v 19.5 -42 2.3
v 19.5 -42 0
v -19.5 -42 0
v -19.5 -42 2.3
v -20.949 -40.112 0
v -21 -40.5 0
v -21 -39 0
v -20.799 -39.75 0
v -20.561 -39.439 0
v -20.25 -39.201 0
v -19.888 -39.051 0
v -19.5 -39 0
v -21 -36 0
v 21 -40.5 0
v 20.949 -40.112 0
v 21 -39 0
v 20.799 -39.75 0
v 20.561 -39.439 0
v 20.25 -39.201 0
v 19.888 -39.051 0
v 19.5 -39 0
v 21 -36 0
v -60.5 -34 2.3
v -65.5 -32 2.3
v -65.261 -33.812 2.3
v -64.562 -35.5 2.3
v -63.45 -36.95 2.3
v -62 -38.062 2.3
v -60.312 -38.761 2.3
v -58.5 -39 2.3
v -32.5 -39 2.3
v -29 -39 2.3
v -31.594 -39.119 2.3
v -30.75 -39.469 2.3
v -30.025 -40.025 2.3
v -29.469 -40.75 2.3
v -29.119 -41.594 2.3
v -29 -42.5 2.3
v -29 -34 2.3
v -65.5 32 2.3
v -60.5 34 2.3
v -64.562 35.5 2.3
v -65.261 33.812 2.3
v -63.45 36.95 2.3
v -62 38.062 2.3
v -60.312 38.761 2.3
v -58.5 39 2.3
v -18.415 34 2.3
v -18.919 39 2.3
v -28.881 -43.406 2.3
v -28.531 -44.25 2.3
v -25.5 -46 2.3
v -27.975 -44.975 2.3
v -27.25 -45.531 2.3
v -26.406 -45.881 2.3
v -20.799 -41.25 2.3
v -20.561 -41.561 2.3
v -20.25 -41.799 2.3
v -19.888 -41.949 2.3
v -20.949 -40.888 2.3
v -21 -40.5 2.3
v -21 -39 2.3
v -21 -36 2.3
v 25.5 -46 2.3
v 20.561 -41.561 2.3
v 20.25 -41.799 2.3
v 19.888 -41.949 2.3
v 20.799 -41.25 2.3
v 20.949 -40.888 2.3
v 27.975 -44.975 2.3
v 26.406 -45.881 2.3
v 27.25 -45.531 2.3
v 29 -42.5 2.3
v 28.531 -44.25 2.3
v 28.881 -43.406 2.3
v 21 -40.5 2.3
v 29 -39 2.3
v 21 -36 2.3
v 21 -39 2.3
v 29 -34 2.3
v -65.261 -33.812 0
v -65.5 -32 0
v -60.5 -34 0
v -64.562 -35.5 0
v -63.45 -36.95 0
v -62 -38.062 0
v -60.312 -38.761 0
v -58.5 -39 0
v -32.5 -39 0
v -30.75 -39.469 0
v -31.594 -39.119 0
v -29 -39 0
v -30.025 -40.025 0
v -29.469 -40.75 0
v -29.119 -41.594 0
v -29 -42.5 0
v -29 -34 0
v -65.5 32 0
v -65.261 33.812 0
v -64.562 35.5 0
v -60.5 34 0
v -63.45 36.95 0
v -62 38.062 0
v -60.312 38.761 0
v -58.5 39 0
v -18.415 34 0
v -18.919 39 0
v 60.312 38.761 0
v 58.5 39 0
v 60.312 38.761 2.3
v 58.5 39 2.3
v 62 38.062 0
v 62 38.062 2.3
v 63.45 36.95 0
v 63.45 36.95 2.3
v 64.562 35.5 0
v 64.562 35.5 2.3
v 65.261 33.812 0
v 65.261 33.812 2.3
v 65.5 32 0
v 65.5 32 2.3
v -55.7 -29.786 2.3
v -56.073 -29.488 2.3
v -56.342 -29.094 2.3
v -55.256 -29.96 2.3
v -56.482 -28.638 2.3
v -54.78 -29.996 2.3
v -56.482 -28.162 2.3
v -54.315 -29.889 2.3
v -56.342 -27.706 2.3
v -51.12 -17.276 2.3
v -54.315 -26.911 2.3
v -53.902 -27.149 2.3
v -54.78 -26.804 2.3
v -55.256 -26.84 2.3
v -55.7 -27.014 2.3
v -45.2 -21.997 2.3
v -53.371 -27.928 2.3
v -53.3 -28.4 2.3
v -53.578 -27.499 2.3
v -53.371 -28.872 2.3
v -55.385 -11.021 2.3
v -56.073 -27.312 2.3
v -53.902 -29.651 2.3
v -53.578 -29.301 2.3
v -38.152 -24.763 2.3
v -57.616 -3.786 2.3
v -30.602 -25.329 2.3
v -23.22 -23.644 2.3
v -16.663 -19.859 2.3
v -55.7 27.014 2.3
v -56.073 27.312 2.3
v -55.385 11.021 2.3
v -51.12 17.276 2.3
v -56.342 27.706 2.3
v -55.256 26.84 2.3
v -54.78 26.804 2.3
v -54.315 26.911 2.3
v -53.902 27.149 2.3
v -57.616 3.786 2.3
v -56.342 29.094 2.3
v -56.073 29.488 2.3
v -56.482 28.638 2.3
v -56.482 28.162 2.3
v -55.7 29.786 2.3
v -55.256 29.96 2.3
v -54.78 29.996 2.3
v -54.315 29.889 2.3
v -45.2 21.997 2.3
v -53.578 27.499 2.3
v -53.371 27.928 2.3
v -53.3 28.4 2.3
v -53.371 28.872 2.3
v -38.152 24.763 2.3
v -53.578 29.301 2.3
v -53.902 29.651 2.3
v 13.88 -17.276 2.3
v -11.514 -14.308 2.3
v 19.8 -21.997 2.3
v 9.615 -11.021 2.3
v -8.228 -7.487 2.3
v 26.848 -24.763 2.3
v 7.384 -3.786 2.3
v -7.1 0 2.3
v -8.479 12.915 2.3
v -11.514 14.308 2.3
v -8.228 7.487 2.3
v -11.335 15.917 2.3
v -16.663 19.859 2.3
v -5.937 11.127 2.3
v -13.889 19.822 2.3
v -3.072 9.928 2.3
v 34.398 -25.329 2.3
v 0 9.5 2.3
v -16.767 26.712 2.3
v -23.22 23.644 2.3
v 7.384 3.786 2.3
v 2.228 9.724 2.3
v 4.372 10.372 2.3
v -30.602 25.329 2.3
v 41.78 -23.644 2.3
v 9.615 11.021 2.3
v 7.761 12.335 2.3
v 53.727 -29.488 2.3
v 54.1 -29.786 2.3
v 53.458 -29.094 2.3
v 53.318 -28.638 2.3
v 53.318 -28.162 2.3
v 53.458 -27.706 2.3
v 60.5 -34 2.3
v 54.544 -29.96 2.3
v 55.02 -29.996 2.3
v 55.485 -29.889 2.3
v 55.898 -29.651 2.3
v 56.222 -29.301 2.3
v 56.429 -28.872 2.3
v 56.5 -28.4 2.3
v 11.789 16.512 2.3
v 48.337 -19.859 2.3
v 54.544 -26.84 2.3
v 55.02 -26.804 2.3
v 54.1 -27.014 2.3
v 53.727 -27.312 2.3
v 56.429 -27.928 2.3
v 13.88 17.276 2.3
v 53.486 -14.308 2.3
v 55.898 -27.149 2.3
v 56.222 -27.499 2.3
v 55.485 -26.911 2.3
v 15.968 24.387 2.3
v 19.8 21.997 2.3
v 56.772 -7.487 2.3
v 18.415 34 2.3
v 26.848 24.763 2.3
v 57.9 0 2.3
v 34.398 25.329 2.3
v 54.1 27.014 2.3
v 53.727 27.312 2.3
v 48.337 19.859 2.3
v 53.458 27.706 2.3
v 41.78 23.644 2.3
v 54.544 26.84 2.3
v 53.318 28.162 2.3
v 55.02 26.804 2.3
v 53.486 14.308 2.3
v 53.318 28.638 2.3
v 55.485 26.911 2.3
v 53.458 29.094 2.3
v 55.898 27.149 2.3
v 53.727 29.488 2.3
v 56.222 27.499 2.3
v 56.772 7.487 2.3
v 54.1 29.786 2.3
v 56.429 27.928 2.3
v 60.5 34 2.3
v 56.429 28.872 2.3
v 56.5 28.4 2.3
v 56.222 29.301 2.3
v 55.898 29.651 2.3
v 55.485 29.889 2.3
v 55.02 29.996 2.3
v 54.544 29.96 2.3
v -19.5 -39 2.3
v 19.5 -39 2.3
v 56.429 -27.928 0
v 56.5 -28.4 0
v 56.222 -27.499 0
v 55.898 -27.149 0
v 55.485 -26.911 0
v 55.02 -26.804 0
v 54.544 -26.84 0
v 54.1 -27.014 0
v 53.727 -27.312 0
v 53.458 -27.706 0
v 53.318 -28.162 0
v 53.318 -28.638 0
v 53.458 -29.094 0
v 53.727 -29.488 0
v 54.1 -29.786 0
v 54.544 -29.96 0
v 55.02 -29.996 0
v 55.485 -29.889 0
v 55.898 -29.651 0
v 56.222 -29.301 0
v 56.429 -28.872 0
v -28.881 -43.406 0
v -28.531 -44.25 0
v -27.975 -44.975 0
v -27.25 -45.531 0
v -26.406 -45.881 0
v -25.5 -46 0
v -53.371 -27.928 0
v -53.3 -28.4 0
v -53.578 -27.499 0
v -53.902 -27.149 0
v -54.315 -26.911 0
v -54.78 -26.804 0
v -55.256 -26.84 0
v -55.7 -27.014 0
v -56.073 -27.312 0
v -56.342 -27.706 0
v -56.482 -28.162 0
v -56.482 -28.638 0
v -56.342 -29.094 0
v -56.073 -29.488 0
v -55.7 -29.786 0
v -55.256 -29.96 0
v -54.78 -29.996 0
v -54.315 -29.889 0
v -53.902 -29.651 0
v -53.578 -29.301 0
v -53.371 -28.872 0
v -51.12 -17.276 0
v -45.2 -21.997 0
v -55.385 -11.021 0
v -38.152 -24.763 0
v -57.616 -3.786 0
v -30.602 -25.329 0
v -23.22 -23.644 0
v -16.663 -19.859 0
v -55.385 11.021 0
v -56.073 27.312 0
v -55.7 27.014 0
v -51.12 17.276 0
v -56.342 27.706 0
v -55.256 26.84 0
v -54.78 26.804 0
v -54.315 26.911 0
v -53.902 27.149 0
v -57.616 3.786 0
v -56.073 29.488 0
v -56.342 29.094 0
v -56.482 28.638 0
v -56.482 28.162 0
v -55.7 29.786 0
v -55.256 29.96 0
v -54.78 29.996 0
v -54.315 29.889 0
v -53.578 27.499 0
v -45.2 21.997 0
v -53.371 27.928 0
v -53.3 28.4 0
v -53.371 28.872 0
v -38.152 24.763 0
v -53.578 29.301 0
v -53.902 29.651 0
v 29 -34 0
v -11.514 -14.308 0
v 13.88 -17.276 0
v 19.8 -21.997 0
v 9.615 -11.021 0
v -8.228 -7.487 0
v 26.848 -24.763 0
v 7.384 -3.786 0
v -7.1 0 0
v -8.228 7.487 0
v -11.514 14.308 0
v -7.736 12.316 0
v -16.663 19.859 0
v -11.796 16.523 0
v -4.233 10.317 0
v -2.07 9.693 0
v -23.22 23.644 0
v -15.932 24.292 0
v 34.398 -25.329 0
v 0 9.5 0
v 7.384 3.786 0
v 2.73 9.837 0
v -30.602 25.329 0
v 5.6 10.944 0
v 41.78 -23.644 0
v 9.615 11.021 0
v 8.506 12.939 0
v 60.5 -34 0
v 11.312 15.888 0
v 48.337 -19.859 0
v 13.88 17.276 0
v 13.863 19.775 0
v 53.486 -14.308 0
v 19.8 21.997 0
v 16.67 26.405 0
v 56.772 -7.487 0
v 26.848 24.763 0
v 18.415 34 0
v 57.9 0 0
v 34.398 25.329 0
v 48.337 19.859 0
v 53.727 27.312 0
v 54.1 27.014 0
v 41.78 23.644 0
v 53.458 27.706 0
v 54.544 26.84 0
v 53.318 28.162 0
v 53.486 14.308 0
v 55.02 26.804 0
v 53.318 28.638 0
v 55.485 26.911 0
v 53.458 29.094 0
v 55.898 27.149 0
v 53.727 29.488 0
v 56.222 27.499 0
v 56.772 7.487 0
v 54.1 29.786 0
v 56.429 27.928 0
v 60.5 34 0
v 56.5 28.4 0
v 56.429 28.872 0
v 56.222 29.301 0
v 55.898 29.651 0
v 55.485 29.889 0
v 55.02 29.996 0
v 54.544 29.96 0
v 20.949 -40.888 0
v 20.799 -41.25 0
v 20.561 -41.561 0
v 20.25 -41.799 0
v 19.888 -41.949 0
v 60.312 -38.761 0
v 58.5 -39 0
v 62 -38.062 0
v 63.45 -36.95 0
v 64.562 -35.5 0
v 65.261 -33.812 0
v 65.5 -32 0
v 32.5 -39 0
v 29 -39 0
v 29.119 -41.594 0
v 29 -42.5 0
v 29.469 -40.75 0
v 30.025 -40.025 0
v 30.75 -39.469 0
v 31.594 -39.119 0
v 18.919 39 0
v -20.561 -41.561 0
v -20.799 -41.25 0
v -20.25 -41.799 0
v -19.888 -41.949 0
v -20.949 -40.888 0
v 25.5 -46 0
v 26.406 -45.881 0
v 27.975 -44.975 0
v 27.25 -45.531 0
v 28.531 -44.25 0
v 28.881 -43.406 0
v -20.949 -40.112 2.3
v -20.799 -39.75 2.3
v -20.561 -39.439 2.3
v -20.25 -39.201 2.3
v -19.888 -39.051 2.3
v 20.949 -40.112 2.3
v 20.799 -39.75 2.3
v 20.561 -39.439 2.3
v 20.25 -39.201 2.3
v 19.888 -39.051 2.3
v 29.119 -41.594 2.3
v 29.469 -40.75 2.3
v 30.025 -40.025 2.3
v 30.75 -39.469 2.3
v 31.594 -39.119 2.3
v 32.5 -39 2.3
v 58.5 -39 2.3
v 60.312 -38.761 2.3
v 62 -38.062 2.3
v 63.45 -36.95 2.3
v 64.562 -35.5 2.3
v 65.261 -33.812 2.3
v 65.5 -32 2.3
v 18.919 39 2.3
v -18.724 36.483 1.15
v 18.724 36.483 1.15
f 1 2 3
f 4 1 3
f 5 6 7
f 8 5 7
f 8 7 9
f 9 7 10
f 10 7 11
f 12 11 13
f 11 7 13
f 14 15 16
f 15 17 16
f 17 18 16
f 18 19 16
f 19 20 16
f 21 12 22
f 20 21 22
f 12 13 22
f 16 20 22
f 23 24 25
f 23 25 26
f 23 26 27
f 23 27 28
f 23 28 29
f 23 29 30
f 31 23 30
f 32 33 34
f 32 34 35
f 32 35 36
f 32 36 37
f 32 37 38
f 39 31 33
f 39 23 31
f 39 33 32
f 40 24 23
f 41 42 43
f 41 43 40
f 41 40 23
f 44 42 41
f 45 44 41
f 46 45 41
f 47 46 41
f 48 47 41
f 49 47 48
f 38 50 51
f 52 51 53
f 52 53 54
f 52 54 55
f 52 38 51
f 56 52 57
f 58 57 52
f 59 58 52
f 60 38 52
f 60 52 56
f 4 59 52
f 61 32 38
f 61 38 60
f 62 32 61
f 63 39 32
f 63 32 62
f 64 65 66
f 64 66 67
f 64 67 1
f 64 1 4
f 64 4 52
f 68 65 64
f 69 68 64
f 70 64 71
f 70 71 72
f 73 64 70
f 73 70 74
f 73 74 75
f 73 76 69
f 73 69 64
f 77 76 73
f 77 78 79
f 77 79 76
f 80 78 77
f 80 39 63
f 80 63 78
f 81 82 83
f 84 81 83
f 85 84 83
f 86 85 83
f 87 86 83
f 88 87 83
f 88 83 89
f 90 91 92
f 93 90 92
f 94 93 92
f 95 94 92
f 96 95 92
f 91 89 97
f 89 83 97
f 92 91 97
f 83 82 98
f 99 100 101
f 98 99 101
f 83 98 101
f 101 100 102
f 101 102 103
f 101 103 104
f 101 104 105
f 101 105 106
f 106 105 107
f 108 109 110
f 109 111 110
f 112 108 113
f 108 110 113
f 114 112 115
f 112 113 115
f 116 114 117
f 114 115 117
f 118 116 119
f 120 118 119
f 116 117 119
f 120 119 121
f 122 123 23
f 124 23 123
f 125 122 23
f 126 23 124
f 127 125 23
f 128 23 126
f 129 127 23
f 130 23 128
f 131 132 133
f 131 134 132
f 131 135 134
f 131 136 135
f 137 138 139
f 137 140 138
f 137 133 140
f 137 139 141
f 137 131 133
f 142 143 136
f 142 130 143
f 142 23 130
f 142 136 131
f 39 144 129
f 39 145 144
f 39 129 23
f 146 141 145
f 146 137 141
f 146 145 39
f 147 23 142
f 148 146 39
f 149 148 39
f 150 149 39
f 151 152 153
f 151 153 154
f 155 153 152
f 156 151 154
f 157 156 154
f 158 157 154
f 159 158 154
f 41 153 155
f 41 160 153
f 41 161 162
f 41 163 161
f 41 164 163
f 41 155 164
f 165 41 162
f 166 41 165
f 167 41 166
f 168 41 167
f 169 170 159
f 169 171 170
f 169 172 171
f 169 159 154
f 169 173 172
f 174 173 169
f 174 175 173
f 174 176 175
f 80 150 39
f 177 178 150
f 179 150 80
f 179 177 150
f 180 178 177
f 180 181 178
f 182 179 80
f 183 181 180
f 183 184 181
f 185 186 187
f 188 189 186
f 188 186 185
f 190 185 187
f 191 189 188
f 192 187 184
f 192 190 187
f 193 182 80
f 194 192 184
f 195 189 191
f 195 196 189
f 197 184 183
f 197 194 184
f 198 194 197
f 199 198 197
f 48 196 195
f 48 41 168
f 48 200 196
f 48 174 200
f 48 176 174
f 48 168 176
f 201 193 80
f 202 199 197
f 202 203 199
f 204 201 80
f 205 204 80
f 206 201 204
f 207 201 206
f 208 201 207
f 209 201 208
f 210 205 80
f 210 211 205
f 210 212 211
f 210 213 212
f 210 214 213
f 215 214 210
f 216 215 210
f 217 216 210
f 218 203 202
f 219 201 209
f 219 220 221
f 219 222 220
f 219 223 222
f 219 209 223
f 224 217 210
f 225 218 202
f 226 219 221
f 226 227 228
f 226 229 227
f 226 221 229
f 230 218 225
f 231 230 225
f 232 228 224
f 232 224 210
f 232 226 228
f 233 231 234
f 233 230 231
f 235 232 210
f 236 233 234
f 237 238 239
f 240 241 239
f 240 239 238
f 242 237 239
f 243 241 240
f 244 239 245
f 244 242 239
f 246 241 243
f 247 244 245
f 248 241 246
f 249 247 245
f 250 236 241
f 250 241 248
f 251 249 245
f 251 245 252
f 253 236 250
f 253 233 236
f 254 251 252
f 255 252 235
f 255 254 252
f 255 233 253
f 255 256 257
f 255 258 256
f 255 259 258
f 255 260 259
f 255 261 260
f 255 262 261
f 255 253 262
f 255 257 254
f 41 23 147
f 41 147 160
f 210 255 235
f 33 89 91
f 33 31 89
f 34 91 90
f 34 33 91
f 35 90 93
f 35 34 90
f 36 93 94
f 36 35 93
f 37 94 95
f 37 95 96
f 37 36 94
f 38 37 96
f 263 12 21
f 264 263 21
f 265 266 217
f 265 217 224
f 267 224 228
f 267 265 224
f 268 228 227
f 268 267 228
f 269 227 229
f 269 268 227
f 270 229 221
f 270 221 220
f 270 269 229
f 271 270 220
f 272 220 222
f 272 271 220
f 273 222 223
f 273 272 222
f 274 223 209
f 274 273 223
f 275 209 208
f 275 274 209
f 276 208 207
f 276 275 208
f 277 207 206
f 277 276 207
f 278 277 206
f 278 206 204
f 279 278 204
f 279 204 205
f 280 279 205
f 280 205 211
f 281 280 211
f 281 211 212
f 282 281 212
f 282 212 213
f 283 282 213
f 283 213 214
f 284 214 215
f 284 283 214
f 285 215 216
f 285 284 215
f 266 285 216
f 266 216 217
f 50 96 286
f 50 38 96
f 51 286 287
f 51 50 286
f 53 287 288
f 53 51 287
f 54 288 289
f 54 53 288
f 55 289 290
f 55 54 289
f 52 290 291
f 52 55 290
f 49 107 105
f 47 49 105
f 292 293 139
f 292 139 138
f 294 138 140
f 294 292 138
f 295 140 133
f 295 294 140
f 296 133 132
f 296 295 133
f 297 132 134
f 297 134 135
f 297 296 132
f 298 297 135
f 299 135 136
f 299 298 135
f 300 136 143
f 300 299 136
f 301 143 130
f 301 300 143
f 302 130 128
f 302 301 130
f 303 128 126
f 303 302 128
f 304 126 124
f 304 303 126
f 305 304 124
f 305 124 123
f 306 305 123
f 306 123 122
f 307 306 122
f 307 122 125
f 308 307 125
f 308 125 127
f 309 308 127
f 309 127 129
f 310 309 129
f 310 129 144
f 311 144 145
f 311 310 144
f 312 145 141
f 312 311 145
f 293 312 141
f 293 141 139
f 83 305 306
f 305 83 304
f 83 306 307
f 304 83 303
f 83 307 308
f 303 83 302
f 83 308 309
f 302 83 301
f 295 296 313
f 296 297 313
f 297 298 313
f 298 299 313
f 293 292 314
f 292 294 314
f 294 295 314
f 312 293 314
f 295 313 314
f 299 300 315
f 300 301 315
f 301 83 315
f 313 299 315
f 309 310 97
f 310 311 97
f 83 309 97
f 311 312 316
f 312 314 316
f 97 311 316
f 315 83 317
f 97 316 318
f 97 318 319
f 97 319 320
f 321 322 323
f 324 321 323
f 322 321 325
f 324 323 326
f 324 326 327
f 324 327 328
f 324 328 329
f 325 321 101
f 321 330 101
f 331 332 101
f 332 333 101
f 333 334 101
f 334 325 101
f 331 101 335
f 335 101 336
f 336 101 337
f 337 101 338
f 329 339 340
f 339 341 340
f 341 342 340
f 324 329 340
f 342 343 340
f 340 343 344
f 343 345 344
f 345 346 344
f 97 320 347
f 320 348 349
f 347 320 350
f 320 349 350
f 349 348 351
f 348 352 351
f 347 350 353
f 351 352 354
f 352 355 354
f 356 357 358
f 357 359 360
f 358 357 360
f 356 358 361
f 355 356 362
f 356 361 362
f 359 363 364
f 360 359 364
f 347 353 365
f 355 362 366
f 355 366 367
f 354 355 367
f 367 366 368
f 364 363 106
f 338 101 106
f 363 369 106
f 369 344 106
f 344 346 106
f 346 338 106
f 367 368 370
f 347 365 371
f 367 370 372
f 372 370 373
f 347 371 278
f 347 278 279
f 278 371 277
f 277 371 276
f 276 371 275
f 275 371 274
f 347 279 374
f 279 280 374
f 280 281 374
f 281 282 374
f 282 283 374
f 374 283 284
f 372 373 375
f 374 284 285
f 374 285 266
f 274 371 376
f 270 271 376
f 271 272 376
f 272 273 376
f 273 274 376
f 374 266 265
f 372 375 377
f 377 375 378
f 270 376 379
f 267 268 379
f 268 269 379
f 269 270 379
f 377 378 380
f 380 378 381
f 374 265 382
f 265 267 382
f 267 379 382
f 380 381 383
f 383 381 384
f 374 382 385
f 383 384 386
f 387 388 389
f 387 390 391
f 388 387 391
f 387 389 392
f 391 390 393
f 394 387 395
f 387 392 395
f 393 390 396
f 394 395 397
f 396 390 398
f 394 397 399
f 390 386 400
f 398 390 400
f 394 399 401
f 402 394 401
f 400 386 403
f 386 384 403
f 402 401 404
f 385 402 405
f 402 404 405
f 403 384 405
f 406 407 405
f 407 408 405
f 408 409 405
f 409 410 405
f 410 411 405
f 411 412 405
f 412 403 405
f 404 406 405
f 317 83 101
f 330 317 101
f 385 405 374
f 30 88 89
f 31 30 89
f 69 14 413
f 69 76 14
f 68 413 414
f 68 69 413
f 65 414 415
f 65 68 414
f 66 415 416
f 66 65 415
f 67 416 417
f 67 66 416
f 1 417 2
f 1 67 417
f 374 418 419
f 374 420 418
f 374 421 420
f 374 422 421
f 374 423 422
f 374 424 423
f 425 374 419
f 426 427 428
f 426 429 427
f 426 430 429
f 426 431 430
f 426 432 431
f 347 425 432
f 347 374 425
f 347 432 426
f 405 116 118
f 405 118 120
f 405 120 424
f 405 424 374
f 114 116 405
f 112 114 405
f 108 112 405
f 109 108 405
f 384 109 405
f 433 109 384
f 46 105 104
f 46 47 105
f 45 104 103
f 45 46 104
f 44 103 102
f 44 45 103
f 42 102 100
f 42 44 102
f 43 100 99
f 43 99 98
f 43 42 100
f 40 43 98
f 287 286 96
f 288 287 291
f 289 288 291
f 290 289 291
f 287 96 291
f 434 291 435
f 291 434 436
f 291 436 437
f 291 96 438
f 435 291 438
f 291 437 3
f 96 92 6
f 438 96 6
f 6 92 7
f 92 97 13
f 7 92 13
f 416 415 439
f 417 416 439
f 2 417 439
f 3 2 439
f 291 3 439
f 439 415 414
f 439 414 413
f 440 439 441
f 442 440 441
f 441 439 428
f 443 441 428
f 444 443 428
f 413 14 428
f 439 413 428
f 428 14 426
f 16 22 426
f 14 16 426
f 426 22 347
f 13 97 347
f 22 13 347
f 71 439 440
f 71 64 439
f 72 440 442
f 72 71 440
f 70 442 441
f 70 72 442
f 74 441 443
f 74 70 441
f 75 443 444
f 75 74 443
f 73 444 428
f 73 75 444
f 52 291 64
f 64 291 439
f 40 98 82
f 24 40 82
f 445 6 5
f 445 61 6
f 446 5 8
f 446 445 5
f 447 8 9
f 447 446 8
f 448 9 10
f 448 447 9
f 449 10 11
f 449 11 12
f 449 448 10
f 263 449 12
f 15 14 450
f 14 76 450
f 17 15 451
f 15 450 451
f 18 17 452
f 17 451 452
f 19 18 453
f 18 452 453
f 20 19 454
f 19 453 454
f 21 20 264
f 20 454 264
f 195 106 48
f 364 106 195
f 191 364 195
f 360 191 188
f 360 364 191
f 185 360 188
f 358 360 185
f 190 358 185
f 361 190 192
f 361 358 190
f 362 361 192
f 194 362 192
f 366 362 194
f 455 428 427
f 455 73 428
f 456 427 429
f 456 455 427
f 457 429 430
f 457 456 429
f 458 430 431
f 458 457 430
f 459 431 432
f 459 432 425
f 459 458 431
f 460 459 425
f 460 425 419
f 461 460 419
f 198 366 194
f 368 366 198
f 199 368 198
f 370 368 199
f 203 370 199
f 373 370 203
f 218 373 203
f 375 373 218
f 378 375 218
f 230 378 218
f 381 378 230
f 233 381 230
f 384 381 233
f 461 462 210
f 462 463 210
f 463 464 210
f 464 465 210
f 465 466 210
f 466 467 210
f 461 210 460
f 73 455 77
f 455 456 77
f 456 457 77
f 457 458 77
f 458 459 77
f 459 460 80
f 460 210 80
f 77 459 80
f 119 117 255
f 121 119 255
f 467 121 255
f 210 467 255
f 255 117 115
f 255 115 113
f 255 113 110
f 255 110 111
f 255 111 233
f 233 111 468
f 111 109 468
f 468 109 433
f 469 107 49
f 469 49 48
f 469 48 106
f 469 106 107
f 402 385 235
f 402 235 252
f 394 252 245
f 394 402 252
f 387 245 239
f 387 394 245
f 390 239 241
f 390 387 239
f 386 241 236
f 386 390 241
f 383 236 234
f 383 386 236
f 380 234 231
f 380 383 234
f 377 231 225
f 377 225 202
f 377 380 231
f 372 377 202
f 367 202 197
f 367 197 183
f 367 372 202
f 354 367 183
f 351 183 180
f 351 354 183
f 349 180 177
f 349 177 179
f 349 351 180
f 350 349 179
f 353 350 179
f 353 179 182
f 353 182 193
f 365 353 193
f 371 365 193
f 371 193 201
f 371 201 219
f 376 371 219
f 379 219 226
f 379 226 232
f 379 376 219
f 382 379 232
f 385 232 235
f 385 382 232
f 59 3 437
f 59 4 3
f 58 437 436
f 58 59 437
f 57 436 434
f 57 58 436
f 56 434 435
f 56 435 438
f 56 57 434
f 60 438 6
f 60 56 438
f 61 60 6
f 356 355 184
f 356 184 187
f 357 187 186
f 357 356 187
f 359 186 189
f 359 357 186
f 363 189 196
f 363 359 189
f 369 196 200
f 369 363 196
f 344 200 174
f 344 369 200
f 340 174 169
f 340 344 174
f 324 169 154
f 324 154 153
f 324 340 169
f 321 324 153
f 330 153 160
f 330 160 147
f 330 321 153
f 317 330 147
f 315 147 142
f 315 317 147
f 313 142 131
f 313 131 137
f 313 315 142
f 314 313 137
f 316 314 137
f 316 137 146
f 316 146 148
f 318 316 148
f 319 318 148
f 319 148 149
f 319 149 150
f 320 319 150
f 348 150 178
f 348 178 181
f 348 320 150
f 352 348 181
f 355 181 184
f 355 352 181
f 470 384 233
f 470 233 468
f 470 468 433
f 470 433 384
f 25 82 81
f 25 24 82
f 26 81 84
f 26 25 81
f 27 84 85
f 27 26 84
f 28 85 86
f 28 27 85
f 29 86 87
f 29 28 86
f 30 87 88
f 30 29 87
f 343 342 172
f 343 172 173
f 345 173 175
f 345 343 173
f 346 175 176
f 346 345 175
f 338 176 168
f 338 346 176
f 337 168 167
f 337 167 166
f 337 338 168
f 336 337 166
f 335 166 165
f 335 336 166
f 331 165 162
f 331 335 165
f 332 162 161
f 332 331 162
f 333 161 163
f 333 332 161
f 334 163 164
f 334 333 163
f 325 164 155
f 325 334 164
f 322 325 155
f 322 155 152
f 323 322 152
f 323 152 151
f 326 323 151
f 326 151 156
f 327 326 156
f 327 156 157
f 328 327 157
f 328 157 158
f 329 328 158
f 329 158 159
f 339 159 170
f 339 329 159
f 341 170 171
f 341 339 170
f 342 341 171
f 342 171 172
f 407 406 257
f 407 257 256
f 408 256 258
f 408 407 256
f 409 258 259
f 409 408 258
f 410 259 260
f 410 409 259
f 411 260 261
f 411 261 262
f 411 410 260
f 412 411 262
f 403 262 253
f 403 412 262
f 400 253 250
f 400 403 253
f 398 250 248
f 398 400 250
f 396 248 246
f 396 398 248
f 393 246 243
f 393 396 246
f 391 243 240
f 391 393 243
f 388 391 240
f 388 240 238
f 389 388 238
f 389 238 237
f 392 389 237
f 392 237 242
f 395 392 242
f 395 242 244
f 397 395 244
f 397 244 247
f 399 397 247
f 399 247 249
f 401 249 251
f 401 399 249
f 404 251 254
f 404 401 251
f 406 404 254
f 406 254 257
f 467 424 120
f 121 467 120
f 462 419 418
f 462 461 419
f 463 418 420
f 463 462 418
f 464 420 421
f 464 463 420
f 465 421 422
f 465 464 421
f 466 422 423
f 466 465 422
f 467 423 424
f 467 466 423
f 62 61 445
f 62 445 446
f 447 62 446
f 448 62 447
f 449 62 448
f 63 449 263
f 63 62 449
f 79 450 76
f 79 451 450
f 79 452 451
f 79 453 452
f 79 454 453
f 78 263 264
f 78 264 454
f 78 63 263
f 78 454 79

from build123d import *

# Parameters (mm, degrees)
F3_DEPTH = 2.3
F0_W     = 121
F0_H     = 68
F0_R     = 1.6
F0_R_2   = 25.4
F4_DEPTH = 25
F6_DEPTH = 2.3
F1_W     = 42
F1_H     = 3
F7_DEPTH = 2.3
F8_R     = 7
F9_R     = 3.49999
F10_R    = 1.49999


# Not quite as in the source:
# - a fillet or chamfer is up to 0.001 mm smaller than in the source, because OpenCascade refuses the exact size


with BuildPart() as f3:
    # F2 (on face) → F3 (new body)
    with BuildSketch(Plane.XY):
        with BuildLine():
            add(Edge.make_bspline(
                [(18.4153846154, 34), (18.7815631387, 36.4662846266), (18.9188800849, 39)],
                knots=[1.3220863377, 1.3220863377, 1.3220863377, 1.4783570414, 1.4783570414, 1.4783570414], degree=2, weights=[1, 0.9969489861, 1]))
            Line((18.4153846154, 34), (60.5, 34))
            Line((60.5, 34), (60.5, -34))
            Line((60.5, -34), (29, -34))
            Line((29, -34), (29, -39))
            Line((29, -39), (65.5, -39))
            Line((65.5, -39), (65.5, 39))
            Line((65.5, 39), (18.9188800849, 39))
        make_face()
    extrude(amount=F3_DEPTH)


with BuildPart() as f3b:
    # F2 (on face) → F3, piece 2 (new body)
    with BuildSketch(Plane.XY):
        with BuildLine():
            Line((-60.5, 34), (-18.4153846154, 34))
            add(Edge.make_bspline(
                [(-18.9188800849, 39), (-18.7815631387, 36.4662846266), (-18.4153846154, 34)],
                knots=[4.8048282657, 4.8048282657, 4.8048282657, 4.9610989695, 4.9610989695, 4.9610989695], degree=2, weights=[1, 0.9969489861, 1]))
            Line((-18.9188800849, 39), (-65.5, 39))
            Line((-65.5, 39), (-65.5, -39))
            Line((-65.5, -39), (-29, -39))
            Line((-29, -39), (-29, -34))
            Line((-29, -34), (-60.5, -34))
            Line((-60.5, -34), (-60.5, 34))
        make_face()
    extrude(amount=F3_DEPTH)


with BuildPart() as f3c:
    # F0 (on Top) → F3, piece 3 (new body)
    with BuildSketch(Plane.XY):
        Rectangle(F0_W, F0_H)
        with Locations((-54.9, -28.4)):
            Circle(F0_R, mode=Mode.SUBTRACT)
        with Locations((54.9, -28.4)):
            Circle(F0_R, mode=Mode.SUBTRACT)
        with Locations((-32.5, 0)):
            Circle(F0_R_2, mode=Mode.SUBTRACT)
        with Locations((-54.9, 28.4)):
            Circle(F0_R, mode=Mode.SUBTRACT)
        with Locations((32.5, 0)):
            Circle(F0_R_2, mode=Mode.SUBTRACT)
        with Locations((54.9, 28.4)):
            Circle(F0_R, mode=Mode.SUBTRACT)
    extrude(amount=F3_DEPTH)

    # F2 (on face) → F4 (cut)
    with BuildSketch(Plane.XY):
        with BuildLine():
            add(Edge.make_bspline(
                [(0, 9.5), (32.9089653438, 9.5), (16.4544826719, 58.25), (0, 107), (-16.4544826719, 58.25), (-32.9089653438, 9.5), (0, 9.5)],
                knots=[0, 0, 0, 2.0943951024, 2.0943951024, 4.1887902048, 4.1887902048, 6.2831853072, 6.2831853072, 6.2831853072], degree=2, weights=[1, 0.5, 1, 0.5, 1, 0.5, 1]))
        make_face()
    extrude(amount=F4_DEPTH, mode=Mode.SUBTRACT)

    # F5: union F3, F3b
    add(f3.part)
    add(f3b.part)

    # F1 (on Top) → F6 (join, through all)
    with BuildSketch(Plane.XY):
        Polygon((29, -39), (29, -34), (-29, -34), (-29, -39), (-21, -39), (-21, -36), (21, -36), (21, -39), align=None)
        Polygon((29, -46), (29, -39), (21, -39), (21, -42), (-21, -42), (-21, -39), (-29, -39), (-29, -46), align=None)
    extrude(amount=F6_DEPTH)

    # F1 (on Top) → F7 (join, through all)
    with BuildSketch(Plane.XY):
        with Locations((0, -37.5)):
            Rectangle(F1_W, F1_H)
    extrude(amount=F7_DEPTH)

    # F8
    f8_edges = [f3c.edges().sort_by_distance(p)[0] for p in [
        (65.5, -39, 1.15),
        (65.5, 39, 1.15),
        (-65.5, 39, 1.15),
        (-65.5, -39, 1.15),
    ]]
    fillet(f8_edges, radius=F8_R)

    # F9 (radius 3.5 in the source; OpenCascade refuses exactly that, so slightly less here)
    f9_edges = [f3c.edges().sort_by_distance(p)[0] for p in [
        (29, -39, 1.15),
        (29, -46, 1.15),
        (-29, -39, 1.15),
        (-29, -46, 1.15),
    ]]
    fillet(f9_edges, radius=F9_R)

    # F10 (radius 1.5 in the source; OpenCascade refuses exactly that, so slightly less here)
    f10_edges = [f3c.edges().sort_by_distance(p)[0] for p in [
        (-21, -42, 1.15),
        (-21, -39, 1.15),
        (21, -42, 1.15),
        (21, -39, 1.15),
    ]]
    fillet(f10_edges, radius=F10_R)


solid = f3c.part
